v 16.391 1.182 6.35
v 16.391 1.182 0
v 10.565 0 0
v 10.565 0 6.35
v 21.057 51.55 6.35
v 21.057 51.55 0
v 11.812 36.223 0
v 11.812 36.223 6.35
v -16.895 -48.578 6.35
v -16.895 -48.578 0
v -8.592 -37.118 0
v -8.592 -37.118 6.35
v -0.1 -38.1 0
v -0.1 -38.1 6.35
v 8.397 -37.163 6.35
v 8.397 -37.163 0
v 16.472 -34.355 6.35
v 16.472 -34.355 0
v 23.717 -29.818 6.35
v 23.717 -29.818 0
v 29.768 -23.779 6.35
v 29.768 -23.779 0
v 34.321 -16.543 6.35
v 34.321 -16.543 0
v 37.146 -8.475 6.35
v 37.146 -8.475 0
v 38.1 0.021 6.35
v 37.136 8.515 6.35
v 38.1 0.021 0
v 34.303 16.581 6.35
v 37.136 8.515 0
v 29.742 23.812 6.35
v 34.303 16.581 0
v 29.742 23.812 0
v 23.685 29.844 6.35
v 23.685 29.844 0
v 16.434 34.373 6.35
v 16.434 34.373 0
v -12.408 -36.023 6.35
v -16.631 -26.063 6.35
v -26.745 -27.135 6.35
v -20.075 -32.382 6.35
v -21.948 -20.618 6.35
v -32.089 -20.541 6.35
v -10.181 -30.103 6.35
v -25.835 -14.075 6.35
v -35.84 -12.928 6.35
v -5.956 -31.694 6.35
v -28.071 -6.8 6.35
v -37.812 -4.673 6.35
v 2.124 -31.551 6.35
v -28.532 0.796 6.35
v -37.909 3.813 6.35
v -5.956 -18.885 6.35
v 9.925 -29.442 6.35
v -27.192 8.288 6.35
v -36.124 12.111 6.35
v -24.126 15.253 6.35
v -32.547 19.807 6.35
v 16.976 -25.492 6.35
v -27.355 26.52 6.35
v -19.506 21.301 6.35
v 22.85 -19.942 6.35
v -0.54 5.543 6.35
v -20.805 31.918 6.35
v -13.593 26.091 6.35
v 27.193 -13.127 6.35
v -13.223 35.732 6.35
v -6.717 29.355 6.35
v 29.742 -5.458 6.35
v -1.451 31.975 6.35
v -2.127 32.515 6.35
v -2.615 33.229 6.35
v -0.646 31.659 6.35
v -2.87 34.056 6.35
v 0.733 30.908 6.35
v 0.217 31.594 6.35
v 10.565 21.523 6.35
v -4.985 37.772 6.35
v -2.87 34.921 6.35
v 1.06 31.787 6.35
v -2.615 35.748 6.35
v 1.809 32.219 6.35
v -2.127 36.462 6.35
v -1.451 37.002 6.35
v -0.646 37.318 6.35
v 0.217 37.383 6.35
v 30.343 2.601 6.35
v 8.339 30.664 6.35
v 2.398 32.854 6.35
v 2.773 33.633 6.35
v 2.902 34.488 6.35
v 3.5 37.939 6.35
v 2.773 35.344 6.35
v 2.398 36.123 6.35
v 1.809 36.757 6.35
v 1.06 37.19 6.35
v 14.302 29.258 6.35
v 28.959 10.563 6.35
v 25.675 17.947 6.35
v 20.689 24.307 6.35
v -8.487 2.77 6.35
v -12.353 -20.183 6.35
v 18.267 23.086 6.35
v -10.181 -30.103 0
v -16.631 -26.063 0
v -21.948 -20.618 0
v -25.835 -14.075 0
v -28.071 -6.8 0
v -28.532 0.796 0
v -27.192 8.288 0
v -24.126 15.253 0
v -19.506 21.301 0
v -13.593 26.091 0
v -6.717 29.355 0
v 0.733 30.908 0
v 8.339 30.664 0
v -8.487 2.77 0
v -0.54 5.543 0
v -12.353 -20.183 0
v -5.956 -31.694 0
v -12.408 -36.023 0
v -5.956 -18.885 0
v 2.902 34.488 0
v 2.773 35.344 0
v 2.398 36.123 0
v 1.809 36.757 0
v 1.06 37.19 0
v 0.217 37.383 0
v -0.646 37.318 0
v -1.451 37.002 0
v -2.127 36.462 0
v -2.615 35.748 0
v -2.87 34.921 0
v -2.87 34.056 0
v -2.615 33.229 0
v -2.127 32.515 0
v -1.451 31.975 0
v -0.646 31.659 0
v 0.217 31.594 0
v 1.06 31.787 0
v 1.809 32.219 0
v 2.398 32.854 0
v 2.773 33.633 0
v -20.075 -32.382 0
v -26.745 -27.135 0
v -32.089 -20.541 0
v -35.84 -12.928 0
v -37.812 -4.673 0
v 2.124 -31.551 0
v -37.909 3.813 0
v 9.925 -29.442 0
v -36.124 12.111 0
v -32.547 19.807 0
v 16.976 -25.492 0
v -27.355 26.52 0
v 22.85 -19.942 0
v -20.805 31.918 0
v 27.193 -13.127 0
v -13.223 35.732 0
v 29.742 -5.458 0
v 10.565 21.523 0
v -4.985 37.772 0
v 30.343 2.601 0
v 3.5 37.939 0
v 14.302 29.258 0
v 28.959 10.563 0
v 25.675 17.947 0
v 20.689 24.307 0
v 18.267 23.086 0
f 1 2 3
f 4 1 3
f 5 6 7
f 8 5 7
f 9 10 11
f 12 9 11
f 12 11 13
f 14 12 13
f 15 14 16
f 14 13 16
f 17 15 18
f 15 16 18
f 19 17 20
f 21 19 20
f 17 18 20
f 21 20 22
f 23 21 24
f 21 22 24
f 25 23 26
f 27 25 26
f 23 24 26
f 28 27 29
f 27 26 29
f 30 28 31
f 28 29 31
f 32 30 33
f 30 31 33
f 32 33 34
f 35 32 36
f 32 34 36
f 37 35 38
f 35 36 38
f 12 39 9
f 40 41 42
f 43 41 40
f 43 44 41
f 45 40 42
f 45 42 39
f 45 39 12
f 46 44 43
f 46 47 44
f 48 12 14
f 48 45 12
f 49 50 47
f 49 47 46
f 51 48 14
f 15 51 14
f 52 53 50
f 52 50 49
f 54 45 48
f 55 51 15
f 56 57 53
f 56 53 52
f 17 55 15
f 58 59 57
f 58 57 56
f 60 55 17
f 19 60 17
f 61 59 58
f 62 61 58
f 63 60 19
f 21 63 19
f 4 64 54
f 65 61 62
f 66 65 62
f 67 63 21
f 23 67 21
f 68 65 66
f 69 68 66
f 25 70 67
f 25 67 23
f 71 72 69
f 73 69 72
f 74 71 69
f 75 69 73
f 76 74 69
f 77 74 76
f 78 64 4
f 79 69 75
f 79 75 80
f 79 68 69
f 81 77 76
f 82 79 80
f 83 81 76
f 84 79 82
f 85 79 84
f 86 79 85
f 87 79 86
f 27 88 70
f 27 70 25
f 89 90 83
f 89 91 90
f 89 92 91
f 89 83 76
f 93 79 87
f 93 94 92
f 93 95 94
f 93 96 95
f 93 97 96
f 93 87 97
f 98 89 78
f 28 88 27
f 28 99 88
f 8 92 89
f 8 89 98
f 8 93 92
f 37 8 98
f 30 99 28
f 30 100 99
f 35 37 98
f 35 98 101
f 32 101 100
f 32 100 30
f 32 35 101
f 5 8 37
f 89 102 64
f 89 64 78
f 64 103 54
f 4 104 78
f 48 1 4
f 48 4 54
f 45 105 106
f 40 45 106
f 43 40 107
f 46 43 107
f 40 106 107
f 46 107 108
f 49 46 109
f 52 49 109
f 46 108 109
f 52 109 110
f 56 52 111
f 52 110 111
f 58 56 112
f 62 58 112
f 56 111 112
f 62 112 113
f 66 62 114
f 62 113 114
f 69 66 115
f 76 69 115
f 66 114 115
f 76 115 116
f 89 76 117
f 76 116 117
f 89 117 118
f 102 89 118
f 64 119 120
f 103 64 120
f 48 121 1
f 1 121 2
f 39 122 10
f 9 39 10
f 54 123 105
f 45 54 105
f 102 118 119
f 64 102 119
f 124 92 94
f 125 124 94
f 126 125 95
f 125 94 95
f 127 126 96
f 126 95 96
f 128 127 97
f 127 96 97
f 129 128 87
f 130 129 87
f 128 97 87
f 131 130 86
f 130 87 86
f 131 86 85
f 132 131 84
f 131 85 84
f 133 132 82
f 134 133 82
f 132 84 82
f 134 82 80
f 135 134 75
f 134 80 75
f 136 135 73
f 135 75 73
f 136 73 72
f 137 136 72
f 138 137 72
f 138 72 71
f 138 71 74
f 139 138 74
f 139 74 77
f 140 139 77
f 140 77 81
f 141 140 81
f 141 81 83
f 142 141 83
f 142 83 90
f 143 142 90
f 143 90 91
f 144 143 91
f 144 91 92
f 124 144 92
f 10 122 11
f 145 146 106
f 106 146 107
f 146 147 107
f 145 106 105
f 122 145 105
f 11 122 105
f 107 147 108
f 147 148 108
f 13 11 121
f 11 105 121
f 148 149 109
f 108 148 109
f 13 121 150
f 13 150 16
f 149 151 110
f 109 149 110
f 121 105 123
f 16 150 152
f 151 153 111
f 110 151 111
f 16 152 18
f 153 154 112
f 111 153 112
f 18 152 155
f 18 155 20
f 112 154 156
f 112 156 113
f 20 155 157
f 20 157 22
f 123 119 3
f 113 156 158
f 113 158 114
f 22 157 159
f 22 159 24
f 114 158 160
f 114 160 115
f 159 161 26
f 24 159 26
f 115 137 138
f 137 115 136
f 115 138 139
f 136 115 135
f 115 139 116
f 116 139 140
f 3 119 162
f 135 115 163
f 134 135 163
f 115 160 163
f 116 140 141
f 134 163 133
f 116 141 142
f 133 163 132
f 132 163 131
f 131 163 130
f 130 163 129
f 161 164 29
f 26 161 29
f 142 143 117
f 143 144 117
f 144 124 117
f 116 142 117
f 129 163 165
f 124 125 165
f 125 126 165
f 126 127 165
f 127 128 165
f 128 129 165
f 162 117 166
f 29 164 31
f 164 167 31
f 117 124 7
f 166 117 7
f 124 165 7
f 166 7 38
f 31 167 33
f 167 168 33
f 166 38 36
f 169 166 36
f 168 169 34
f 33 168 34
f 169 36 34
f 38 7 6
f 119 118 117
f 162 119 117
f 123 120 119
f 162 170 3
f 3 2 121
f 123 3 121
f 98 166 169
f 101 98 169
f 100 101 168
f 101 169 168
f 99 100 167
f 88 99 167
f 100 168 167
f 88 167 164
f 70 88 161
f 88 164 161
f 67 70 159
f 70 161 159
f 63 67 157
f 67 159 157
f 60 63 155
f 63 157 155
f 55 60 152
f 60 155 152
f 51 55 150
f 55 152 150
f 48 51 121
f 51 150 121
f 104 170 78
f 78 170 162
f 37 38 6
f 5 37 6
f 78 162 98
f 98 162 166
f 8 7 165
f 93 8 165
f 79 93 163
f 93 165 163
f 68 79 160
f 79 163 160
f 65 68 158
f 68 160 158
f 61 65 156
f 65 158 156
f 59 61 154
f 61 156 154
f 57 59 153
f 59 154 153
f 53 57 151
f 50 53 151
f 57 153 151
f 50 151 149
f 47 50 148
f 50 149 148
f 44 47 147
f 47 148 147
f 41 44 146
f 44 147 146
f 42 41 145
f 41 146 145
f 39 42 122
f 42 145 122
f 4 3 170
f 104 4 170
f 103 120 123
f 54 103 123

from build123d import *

# Parameters (mm, degrees)
F1_DEPTH = 6.35
F2_R     = 2.9021462782
F3_DEPTH = 12.7


# Not quite as in the source:
# - a feature names something its author has since deleted; it is built from what else it names


with BuildPart() as f1:
    # F0 (on Top) → F1 (new body)
    with BuildSketch(Plane.XY):
        with BuildLine():
            Line((16.4344385917, 34.3732341826), (21.0574541174, 51.5500892249))
            Line((21.0574541174, 51.5500892249), (11.8116865515, 36.2228389391))
            ThreePointArc((11.8116865515, 36.2228389391), (-36.1240313077, 12.1105062684), (-12.4084995786, -36.0227586146))
            Line((-12.4084995786, -36.0227586146), (-16.8951376196, -48.5777822575))
            Line((-16.8951376196, -48.5777822575), (-8.5923329011, -37.1184834727))
            ThreePointArc((-8.5923329011, -37.1184834727), (35.960270838, -12.5884439569), (16.4344385917, 34.3732341826))
        make_face()
        with BuildLine():
            Line((-5.9558603501, -18.8854594723), (-10.1813612864, -30.1025640222))
            ThreePointArc((-10.1813612864, -30.1025640222), (-27.192206018, 8.287747581), (8.3393088452, 30.6639920157))
            Line((8.3393088452, 30.6639920157), (-8.4871153459, 2.7698433524))
            Line((-8.4871153459, 2.7698433524), (-0.5399501962, 5.5430036832))
            Line((-0.5399501962, 5.5430036832), (-12.3529230131, -20.1834143903))
            Line((-12.3529230131, -20.1834143903), (-5.9558603501, -18.8854594723))
        make_face(mode=Mode.SUBTRACT)
        with BuildLine():
            Line((10.5646807305, 0), (18.2668235735, 23.0856431528))
            Line((18.2668235735, 23.0856431528), (10.5646807305, 21.522889322))
            Line((10.5646807305, 21.522889322), (14.302094467, 29.2579978704))
            ThreePointArc((14.302094467, 29.2579978704), (28.7040765344, -9.3712062036), (-5.9558603501, -31.6943168745))
            Line((-5.9558603501, -31.6943168745), (16.3907865629, 1.182108589))
            Line((16.3907865629, 1.182108589), (10.5646807305, 0))
        make_face(mode=Mode.SUBTRACT)
    extrude(amount=F1_DEPTH)

    # F2 (on face) → F3 (cut)
    with BuildSketch(Plane.XY.offset(6.35)):
        with Locations((0, 34.4884768128)):
            Circle(F2_R)
    extrude(amount=-F3_DEPTH, mode=Mode.SUBTRACT)


solid = f1.part
